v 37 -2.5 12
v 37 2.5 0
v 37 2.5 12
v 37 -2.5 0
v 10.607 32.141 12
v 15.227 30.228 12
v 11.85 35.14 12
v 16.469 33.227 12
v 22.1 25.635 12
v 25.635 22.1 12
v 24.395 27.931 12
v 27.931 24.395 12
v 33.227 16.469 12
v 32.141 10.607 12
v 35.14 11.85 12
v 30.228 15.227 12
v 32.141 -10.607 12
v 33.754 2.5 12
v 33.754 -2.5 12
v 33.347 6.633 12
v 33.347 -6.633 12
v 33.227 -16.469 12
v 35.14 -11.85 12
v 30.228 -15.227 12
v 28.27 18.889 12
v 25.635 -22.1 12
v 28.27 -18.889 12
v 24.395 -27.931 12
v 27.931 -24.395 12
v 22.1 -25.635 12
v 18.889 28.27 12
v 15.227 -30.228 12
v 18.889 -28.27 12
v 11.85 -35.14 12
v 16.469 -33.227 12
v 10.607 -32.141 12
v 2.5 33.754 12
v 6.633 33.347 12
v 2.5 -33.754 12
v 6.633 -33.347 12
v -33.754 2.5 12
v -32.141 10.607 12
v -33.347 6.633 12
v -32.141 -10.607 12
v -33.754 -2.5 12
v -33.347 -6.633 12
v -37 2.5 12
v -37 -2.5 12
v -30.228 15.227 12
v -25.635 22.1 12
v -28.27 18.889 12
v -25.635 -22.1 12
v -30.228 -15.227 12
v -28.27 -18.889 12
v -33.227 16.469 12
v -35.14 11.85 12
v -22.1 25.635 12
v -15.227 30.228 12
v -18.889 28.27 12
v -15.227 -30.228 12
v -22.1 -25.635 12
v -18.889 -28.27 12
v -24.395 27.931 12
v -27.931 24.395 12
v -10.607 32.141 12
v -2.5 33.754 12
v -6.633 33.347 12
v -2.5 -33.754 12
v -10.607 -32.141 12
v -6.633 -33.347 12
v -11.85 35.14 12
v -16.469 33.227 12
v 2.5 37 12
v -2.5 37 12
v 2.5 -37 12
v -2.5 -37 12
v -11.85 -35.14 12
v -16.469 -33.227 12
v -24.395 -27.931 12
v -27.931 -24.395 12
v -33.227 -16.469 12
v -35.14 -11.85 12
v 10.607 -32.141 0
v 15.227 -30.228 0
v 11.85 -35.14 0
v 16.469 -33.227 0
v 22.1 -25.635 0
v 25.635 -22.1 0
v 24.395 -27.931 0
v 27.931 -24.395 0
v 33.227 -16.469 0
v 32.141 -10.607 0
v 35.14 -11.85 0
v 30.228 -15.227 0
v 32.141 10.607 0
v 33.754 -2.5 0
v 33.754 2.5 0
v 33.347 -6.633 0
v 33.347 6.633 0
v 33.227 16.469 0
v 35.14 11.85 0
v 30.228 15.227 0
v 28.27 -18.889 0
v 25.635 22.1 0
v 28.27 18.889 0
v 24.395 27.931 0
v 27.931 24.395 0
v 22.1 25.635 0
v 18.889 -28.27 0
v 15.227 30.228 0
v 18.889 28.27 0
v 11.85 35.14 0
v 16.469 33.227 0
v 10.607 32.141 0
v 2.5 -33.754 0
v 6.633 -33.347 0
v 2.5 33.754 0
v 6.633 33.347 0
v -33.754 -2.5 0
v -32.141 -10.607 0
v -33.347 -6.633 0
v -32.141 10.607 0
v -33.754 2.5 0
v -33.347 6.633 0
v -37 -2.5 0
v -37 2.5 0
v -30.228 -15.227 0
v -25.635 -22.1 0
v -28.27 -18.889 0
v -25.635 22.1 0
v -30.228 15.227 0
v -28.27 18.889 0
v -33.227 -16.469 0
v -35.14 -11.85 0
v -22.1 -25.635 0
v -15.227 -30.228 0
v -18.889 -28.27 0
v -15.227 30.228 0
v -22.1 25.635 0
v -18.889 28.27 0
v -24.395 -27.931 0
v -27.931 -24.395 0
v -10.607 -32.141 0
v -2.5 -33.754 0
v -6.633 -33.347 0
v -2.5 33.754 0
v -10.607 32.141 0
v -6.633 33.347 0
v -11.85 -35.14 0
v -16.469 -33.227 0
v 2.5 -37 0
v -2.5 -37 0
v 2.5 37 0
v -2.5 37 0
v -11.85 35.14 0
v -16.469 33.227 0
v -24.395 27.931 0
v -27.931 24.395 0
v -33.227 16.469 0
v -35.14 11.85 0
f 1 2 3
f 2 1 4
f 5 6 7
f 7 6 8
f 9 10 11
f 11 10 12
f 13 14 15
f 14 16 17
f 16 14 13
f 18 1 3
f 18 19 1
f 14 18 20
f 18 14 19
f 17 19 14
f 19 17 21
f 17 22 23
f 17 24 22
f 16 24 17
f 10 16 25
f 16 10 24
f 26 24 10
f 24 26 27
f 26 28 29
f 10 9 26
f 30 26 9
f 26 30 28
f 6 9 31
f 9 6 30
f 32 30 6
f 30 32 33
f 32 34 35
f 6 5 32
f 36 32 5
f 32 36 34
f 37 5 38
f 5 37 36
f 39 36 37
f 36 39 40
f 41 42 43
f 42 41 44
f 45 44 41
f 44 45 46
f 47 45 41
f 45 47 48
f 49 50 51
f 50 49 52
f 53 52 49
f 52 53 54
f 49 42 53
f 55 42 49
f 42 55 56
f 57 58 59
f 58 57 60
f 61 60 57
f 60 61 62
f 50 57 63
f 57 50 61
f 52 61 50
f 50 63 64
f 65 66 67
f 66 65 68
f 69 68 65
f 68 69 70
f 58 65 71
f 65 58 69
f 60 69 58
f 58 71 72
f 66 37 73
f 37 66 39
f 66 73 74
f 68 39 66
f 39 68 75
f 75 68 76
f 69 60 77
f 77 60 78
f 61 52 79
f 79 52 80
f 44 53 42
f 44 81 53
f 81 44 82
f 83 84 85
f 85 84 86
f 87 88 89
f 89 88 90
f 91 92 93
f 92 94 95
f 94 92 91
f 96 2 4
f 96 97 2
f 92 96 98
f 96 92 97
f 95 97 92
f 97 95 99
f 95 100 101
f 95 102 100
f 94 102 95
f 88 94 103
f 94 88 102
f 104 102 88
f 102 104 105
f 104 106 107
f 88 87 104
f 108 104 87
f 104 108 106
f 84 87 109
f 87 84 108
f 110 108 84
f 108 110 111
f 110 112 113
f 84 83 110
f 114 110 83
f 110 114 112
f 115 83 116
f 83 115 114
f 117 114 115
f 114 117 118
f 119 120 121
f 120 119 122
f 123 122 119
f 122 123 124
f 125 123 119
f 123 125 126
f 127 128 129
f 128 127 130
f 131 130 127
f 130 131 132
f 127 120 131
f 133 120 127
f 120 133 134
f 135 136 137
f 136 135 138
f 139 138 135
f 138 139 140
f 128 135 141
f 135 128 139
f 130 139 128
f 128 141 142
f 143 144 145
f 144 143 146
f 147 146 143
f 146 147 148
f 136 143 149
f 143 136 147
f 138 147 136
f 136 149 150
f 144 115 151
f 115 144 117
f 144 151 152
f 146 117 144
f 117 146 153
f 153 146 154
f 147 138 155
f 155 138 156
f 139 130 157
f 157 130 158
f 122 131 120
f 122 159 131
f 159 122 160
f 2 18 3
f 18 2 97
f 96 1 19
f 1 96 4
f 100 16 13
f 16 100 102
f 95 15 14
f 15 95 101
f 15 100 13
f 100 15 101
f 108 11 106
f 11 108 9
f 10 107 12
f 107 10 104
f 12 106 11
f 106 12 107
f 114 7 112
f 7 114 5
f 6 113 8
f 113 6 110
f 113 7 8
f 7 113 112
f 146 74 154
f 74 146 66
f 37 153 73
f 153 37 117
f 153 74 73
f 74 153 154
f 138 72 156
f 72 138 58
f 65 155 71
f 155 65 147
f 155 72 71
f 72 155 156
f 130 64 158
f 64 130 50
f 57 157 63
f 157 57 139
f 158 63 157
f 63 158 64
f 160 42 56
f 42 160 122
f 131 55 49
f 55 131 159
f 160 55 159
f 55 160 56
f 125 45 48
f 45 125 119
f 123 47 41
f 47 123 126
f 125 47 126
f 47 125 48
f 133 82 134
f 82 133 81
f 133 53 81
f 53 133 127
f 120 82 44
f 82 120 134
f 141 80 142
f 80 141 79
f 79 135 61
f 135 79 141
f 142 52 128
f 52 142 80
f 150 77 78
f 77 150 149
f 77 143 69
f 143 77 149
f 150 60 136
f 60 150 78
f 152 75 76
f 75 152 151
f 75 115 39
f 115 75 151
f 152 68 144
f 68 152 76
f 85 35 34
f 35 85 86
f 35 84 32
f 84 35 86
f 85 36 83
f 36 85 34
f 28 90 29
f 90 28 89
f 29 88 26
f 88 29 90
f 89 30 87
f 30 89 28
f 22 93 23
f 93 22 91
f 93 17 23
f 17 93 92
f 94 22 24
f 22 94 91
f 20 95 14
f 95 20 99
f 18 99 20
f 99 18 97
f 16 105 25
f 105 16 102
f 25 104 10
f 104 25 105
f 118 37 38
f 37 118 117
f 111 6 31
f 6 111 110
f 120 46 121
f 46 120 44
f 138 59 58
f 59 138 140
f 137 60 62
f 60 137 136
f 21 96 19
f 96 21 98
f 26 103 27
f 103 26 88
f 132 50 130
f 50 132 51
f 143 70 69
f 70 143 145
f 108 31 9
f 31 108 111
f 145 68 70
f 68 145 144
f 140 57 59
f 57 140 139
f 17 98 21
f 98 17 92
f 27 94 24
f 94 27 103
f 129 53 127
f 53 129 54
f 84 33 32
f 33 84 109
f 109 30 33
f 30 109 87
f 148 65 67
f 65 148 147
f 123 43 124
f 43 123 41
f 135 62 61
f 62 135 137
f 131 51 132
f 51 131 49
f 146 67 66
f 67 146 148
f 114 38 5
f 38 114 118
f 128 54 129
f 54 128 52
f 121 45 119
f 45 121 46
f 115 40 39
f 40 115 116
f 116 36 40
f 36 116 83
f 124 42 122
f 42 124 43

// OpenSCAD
$fn = 32;

// ----------------------------------------------------------------------
// Spur blank: plain gear blank
// ----------------------------------------------------------------------

// --- parameters (mm) ---
disc_r = 34;              // blank root radius
disc_t = 12;              // blank thickness
n_teeth = 16;             // stub tooth count
tooth_w = 5;              // tooth width at the root
tooth_h = 3;              // tooth height above the root
fit_tol = 0.1;            // tolerance for press fits, mm
free_tol = 0.5;           // tolerance for clearance fits, mm

out_r = disc_r + tooth_h;  // tip radius
bbox_x = 74.0;  // measured width over the teeth
bbox_y = 74.0;  // measured depth over the teeth

union() {
  cylinder(r = disc_r, h = disc_t);
  for (i = [0 : n_teeth - 1])
    rotate([0, 0, i * 360 / n_teeth])
      translate([disc_r - 1, -tooth_w / 2, 0])
        cube([tooth_h + 1, tooth_w, disc_t]);
}
